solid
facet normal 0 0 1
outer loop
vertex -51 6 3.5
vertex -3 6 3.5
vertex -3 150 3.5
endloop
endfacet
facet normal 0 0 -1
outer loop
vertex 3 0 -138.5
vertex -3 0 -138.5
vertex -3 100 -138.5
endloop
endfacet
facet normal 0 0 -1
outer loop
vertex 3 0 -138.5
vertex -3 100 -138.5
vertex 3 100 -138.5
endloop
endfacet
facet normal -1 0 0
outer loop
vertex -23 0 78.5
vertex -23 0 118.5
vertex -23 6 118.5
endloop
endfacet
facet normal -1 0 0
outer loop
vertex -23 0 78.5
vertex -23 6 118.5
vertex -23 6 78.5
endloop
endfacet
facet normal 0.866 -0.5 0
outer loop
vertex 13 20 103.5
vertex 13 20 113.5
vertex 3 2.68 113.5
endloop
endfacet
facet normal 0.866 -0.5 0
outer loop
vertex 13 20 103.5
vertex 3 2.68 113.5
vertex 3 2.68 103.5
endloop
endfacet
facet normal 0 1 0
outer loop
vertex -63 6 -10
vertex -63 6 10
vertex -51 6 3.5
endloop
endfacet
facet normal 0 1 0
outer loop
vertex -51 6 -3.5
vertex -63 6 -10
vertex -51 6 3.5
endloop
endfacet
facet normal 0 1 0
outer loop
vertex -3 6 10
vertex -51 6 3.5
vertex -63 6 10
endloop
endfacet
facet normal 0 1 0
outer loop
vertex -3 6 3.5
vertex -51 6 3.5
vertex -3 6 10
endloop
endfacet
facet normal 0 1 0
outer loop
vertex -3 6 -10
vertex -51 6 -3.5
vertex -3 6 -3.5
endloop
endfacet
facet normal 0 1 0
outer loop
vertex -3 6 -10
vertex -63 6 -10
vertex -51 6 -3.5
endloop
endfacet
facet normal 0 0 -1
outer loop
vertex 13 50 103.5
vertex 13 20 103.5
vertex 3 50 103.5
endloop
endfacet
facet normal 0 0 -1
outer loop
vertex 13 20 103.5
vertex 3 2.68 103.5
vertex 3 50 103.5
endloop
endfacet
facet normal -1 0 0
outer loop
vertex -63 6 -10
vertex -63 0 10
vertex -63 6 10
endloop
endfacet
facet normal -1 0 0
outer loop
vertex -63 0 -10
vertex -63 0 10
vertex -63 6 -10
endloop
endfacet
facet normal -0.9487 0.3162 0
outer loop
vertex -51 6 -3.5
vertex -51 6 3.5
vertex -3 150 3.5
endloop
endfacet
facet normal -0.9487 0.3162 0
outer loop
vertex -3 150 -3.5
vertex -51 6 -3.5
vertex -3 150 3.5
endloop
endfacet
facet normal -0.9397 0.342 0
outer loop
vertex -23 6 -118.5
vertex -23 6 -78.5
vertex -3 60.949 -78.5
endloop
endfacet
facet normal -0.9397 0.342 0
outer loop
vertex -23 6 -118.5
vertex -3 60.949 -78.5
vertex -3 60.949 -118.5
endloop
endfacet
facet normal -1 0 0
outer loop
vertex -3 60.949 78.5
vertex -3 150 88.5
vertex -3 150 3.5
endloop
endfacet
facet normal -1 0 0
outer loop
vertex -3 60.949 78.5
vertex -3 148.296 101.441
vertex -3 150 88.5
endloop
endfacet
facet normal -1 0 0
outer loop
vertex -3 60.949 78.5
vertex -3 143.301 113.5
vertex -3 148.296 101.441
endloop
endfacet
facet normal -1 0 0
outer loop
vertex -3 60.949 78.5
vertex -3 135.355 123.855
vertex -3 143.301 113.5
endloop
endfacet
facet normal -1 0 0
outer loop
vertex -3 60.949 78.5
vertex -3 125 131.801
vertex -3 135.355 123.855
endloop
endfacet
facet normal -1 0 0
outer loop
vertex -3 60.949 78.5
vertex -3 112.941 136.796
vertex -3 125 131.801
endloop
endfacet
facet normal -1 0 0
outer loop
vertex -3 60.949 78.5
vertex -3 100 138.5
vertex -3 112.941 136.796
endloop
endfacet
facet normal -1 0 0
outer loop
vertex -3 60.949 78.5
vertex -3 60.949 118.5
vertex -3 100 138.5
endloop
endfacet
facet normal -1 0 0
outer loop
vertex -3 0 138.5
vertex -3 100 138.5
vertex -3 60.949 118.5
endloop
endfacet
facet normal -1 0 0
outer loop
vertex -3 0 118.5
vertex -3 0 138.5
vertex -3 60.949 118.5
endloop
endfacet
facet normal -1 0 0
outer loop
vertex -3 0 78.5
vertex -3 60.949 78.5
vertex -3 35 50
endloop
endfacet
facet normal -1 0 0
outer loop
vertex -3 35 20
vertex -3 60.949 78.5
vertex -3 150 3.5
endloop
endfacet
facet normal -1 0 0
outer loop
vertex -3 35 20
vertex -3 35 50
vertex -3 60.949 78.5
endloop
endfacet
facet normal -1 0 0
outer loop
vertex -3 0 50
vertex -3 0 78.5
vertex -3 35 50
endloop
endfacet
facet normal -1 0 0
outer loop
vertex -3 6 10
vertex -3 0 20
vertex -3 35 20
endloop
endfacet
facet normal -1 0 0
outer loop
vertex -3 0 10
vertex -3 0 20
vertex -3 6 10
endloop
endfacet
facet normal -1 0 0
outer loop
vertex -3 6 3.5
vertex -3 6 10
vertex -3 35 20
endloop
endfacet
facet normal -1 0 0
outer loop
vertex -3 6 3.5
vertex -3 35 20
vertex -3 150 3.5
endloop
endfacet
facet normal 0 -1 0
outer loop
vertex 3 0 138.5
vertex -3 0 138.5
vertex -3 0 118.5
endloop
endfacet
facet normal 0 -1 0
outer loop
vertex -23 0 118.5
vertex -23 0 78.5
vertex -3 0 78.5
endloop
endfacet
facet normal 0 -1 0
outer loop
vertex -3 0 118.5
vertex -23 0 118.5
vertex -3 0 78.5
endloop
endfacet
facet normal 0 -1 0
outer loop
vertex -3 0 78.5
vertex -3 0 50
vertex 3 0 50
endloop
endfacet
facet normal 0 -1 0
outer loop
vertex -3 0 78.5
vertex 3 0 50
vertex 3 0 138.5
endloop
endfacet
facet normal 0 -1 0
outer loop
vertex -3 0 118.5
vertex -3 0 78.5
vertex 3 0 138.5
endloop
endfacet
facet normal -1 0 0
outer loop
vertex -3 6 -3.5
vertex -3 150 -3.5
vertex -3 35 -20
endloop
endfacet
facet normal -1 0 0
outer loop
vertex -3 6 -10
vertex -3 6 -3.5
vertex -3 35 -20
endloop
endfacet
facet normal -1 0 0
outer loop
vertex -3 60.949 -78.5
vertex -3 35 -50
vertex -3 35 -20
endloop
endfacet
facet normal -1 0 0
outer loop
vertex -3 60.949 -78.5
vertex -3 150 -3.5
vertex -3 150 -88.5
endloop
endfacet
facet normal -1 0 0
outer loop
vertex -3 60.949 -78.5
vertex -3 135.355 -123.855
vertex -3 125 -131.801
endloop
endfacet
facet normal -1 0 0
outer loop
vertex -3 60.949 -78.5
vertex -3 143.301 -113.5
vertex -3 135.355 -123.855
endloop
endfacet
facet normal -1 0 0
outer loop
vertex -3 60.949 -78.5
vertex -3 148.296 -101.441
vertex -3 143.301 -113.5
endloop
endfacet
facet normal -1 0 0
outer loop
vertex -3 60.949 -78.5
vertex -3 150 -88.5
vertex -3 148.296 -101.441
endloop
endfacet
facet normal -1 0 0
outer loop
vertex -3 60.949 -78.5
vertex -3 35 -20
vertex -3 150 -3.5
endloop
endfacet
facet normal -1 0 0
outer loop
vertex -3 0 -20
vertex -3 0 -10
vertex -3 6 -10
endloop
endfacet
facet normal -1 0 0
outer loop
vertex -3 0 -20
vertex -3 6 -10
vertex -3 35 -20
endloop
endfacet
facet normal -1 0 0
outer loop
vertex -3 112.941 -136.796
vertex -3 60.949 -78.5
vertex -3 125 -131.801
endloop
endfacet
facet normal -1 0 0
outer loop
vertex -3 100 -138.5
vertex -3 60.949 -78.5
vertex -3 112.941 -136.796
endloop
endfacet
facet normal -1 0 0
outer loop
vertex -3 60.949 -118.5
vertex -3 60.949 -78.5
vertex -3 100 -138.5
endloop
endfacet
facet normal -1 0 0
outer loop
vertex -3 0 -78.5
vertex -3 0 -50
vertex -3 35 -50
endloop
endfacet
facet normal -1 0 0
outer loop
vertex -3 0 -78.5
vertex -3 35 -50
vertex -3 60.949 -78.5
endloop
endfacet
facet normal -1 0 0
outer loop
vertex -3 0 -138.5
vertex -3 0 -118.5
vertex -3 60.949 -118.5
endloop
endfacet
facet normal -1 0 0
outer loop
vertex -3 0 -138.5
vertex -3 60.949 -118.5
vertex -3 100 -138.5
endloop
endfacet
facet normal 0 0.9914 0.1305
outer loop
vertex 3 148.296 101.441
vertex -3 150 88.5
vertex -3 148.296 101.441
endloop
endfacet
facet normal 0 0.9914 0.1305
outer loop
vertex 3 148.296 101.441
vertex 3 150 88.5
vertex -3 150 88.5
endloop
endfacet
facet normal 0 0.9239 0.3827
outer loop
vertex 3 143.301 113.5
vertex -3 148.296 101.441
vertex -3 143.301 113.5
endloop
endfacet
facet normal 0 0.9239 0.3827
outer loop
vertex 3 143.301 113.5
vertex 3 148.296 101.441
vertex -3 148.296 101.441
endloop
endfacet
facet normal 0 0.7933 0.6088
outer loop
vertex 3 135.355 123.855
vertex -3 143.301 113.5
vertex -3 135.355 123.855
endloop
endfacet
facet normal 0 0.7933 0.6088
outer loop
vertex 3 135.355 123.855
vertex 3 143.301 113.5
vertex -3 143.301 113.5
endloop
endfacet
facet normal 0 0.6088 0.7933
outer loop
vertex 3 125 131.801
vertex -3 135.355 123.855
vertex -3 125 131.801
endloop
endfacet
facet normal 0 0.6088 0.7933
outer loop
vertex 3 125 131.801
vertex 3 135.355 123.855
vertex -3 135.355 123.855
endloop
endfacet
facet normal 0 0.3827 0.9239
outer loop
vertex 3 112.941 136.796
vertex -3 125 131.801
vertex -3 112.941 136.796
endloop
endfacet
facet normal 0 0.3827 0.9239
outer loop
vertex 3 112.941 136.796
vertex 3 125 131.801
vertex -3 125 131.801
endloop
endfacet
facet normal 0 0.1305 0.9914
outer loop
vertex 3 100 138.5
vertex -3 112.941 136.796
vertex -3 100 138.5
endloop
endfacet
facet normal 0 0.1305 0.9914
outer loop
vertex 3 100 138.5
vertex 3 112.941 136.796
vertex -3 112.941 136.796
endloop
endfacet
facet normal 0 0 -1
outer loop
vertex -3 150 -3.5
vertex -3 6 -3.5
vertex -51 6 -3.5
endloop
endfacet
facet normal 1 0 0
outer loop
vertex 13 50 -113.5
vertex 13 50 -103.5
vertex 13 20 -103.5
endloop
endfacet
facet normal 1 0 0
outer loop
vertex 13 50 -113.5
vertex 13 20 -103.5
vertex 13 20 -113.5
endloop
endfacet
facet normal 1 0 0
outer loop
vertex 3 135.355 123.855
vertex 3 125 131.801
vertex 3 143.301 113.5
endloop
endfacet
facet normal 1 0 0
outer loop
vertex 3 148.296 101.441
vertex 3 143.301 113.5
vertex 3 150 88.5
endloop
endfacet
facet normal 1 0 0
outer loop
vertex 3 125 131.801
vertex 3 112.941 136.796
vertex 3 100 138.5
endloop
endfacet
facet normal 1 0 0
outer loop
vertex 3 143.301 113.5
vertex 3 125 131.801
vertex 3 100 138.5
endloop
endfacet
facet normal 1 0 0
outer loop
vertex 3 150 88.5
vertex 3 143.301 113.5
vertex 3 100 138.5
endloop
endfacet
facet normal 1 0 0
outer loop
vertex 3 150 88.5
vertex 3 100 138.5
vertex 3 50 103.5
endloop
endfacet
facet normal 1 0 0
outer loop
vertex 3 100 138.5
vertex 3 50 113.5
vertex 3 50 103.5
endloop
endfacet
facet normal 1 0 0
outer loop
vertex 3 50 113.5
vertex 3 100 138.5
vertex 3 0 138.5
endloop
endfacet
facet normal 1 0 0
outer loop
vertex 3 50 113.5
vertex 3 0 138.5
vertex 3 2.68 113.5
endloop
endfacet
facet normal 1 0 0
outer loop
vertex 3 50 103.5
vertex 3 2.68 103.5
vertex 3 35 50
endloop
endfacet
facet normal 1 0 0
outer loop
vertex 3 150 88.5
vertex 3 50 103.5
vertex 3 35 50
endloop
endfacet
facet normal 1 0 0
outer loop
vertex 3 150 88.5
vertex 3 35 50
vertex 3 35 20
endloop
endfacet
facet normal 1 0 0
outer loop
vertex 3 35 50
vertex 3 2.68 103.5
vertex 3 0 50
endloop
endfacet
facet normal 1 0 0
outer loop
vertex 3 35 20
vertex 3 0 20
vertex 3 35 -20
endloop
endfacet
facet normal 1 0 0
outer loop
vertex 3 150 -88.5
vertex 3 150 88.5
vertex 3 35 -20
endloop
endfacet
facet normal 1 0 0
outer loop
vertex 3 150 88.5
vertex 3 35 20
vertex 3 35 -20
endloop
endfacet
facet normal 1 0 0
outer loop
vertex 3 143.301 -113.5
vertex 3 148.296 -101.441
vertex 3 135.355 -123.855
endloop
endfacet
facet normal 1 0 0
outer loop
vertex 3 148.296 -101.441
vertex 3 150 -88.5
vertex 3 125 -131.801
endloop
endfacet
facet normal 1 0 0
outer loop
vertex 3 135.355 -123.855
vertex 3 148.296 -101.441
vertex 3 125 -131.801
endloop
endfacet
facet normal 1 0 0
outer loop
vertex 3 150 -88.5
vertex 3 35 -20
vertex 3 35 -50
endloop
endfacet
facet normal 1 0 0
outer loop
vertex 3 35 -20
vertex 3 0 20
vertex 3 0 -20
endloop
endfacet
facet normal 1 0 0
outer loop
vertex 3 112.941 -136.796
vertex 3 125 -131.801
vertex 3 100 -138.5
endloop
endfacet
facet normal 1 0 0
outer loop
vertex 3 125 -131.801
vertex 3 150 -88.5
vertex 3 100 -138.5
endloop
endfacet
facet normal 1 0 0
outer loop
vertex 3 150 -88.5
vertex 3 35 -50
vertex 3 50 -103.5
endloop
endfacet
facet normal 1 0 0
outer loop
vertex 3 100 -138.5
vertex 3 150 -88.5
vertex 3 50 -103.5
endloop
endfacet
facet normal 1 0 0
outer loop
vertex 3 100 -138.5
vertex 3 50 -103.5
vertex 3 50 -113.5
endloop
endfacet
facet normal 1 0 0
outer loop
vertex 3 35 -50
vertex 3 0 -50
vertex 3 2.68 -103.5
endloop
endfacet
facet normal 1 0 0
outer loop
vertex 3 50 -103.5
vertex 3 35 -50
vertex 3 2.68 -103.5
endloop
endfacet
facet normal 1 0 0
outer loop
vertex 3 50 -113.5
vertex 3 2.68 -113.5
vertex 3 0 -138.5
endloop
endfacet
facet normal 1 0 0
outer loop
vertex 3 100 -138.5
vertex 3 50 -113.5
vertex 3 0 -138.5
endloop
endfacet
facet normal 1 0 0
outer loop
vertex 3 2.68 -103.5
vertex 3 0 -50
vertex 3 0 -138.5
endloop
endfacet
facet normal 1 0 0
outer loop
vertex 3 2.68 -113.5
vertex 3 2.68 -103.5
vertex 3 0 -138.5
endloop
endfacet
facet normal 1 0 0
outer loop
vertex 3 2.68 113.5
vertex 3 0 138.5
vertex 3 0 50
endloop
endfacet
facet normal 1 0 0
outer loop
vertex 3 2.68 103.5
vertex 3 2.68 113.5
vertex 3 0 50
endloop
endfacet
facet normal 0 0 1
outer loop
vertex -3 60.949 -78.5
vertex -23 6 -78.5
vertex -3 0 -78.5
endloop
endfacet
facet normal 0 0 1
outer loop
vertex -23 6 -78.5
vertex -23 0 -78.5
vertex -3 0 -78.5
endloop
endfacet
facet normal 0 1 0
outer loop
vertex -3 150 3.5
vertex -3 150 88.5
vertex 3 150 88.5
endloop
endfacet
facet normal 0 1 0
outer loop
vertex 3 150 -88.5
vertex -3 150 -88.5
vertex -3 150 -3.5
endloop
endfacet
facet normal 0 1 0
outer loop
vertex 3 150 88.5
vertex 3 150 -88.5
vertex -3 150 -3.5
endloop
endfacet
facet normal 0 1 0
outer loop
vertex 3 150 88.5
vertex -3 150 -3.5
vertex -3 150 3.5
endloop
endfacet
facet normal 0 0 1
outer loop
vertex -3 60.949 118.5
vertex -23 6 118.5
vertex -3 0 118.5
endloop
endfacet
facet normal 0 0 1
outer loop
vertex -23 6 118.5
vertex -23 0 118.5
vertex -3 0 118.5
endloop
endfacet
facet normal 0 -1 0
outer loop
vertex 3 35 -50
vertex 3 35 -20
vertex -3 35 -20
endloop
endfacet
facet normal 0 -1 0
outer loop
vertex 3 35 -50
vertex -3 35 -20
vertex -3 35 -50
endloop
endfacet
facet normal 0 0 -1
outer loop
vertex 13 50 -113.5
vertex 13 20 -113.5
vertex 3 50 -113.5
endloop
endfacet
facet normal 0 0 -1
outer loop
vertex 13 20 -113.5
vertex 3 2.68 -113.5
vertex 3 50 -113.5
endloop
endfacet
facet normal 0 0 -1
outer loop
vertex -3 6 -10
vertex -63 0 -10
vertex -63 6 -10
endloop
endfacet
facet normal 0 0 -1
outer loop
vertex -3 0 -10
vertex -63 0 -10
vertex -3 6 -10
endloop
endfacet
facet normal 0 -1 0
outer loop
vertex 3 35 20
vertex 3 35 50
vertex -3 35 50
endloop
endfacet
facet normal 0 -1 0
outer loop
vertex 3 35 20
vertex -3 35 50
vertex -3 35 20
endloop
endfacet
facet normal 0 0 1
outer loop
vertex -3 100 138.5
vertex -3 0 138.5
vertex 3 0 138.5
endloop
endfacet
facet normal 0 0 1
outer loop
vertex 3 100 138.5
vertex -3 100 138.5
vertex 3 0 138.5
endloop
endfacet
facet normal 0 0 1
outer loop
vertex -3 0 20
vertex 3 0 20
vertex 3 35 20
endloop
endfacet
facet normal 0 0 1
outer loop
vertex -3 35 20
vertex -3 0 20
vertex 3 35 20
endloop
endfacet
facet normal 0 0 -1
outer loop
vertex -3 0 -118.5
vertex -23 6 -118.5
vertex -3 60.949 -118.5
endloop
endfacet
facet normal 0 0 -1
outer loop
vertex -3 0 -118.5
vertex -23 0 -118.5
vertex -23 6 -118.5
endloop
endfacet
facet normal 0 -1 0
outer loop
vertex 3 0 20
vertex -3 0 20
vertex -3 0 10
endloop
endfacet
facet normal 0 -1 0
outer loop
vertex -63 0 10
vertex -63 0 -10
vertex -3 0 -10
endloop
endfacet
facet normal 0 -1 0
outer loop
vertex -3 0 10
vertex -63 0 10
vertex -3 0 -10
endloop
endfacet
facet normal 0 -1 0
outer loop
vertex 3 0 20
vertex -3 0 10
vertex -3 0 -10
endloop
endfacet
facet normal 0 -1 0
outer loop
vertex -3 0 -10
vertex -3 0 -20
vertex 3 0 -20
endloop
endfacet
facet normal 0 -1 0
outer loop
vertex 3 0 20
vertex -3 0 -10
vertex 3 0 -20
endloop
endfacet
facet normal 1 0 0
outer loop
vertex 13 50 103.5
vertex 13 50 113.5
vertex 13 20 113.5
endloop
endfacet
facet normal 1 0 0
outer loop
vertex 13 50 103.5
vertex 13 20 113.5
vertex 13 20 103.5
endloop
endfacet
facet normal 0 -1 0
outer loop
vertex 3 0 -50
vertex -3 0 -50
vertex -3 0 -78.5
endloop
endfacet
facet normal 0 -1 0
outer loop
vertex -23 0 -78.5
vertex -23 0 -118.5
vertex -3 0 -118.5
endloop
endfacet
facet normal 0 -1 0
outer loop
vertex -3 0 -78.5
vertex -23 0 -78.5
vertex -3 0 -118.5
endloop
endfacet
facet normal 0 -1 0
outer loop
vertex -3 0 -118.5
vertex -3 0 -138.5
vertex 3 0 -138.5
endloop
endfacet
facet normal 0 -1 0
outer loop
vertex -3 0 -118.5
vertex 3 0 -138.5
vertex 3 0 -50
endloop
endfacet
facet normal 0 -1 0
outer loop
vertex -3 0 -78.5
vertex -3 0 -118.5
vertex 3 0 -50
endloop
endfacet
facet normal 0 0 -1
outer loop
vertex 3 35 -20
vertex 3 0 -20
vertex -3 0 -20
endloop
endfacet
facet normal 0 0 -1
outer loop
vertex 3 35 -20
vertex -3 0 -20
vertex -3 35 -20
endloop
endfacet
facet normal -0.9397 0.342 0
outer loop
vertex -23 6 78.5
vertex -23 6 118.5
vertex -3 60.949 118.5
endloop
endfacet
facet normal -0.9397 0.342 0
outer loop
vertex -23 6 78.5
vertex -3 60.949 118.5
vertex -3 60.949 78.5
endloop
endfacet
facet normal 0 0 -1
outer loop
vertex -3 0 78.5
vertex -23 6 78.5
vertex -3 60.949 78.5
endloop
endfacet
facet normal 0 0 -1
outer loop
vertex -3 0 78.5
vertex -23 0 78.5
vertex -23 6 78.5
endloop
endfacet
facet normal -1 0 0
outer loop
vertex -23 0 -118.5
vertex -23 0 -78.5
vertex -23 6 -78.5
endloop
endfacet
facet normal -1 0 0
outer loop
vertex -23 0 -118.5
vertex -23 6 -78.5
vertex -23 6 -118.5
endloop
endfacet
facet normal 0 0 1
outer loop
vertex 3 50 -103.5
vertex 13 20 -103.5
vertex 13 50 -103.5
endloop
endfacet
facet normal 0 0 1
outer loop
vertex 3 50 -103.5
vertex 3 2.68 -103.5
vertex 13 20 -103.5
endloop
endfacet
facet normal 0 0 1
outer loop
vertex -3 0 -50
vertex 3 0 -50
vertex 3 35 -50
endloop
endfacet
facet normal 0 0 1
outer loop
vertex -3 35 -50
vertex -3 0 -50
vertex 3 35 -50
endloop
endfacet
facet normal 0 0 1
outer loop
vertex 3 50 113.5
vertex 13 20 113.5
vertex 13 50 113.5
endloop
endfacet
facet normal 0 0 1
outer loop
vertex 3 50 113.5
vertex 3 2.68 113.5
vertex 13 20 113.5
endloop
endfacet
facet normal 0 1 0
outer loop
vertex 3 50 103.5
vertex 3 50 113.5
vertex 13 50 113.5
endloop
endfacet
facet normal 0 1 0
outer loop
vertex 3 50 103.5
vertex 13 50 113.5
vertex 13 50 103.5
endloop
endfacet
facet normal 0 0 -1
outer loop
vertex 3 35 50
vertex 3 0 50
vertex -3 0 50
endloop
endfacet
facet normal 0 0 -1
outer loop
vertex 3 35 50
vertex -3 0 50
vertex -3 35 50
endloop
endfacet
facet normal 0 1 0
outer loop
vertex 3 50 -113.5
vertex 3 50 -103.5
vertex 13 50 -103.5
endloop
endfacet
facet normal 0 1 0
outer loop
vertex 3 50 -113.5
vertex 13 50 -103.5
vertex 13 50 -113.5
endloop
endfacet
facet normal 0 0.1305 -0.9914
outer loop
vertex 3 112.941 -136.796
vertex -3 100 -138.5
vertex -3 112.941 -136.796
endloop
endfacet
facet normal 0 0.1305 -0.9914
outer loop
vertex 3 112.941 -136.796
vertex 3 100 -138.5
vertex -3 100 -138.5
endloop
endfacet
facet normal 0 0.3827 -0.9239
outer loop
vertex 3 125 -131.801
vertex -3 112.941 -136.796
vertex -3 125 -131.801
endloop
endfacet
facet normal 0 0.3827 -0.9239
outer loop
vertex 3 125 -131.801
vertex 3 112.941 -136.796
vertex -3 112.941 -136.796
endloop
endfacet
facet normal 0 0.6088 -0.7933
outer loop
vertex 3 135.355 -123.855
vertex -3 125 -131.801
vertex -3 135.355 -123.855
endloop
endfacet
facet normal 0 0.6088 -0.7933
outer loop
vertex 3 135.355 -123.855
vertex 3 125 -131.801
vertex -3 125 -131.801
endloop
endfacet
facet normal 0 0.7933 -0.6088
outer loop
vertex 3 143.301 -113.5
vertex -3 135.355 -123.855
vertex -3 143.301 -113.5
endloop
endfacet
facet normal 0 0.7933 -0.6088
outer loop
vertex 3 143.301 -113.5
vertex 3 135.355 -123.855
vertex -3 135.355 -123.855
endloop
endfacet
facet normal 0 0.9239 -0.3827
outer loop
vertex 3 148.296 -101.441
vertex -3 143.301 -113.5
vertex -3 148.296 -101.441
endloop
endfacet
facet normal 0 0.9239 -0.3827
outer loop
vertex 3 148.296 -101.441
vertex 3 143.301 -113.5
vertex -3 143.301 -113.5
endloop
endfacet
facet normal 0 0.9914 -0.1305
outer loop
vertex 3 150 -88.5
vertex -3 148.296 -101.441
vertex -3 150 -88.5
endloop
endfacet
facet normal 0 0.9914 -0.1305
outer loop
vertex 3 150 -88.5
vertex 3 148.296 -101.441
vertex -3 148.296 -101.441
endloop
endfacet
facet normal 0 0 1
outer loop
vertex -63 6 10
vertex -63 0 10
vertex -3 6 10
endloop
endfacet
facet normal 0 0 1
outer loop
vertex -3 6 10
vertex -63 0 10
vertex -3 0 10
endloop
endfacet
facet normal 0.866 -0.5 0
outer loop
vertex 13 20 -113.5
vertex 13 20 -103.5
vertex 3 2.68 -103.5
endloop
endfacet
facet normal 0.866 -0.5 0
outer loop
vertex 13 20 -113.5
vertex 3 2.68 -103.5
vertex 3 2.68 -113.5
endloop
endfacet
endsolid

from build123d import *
from OCP.BRepFilletAPI import BRepFilletAPI_MakeChamfer

# Parameters (mm, degrees)
SKETCH_1_W          = 6
SKETCH_1_H          = 277
EXTRUDE_1_DEPTH     = 150
SKETCH_2_W          = 20
SKETCH_2_H          = 40
SKETCH_2_W_2        = 60
SKETCH_2_H_2        = 20
EXTRUDE_2_DEPTH     = 6
EXTRUDE_3_DEPTH     = 7
CHAMFER_2_SIZE      = 54.949548389
CHAMFER_2_SIZE_2    = 20
SKETCH_5_W          = 10
SKETCH_5_H          = 30
EXTRUDE_4_DEPTH     = 10
CHAMFER_3_SIZE      = 17.320508076
CHAMFER_3_SIZE_2    = 10
SKETCH_6_W          = 30
SKETCH_6_H          = 35
CUT_EXTRUDE_1_DEPTH = 10
FILLET_2_R          = 50


with BuildPart() as part:
    # Эскиз1 → Бобышка-Вытянуть1 (new body)
    with BuildSketch(Plane(origin=(0, 0, 0), x_dir=(1, 0, 0), z_dir=(0, 1, 0))):
        Rectangle(SKETCH_1_W, SKETCH_1_H)
    extrude(amount=EXTRUDE_1_DEPTH)

    # Эскиз2 → Бобышка-Вытянуть2 (add)
    with BuildSketch(Plane(origin=(0, 0, 0), x_dir=(1, 0, 0), z_dir=(0, 1, 0))):
        with Locations((-13, 98.5)):
            Rectangle(SKETCH_2_W, SKETCH_2_H)
        with Locations((-13, -98.5)):
            Rectangle(SKETCH_2_W, SKETCH_2_H)
        with Locations((-33, 0)):
            Rectangle(SKETCH_2_W_2, SKETCH_2_H_2)
    extrude(amount=EXTRUDE_2_DEPTH)

    # Эскиз3 → Бобышка-Вытянуть3 (add)
    with BuildSketch(Plane.XY.offset(3.5)):
        Polygon((-3, 6), (-51, 6), (-3, 150), align=None)
    extrude(amount=-EXTRUDE_3_DEPTH)

    # Фаска2
    chamfer_2_edges_1 = [part.edges().sort_by_distance(p)[0] for p in [
        (-3, 6, 98.5),
    ]]
    chamfer_2_side_1 = [part.faces().sort_by_distance(p)[0] for p in [
        (-3, 6.4, 98.5),
    ]]
    chamfer_2_edges_2 = [part.edges().sort_by_distance(p)[0] for p in [
        (-3, 6, -98.5),
    ]]
    chamfer_2_side_2 = [part.faces().sort_by_distance(p)[0] for p in [
        (-3, 6.4, -98.5),
    ]]
    chamfer_2 = BRepFilletAPI_MakeChamfer(part.part.solid().wrapped)
    for e in chamfer_2_edges_1:
        chamfer_2.Add(CHAMFER_2_SIZE - 0.0001, CHAMFER_2_SIZE_2 - 0.0001, e.wrapped, chamfer_2_side_1[0].wrapped)
    for e in chamfer_2_edges_2:
        chamfer_2.Add(CHAMFER_2_SIZE - 0.0001, CHAMFER_2_SIZE_2 - 0.0001, e.wrapped, chamfer_2_side_2[0].wrapped)
    add(Compound.cast(chamfer_2.Shape()), mode=Mode.REPLACE)  # a hair under: the kernel refuses the full size

    # Эскиз5 → Бобышка-Вытянуть4 (add)
    with BuildSketch(Plane(origin=(3, 0, 0), x_dir=(0, 0, -1), z_dir=(1, 0, 0))):
        with Locations((-108.5, 35)):
            Rectangle(SKETCH_5_W, SKETCH_5_H)
        with Locations((108.5, 35)):
            Rectangle(SKETCH_5_W, SKETCH_5_H)
    extrude(amount=EXTRUDE_4_DEPTH)

    # Фаска3
    chamfer_3_edges_1 = [part.edges().sort_by_distance(p)[0] for p in [
        (3, 20, 108.5),
    ]]
    chamfer_3_side_1 = [part.faces().sort_by_distance(p)[0] for p in [
        (3, 19.8, 108.5),
    ]]
    chamfer_3_edges_2 = [part.edges().sort_by_distance(p)[0] for p in [
        (3, 20, -108.5),
    ]]
    chamfer_3_side_2 = [part.faces().sort_by_distance(p)[0] for p in [
        (3, 19.8, -108.5),
    ]]
    chamfer_3 = BRepFilletAPI_MakeChamfer(part.part.solid().wrapped)
    for e in chamfer_3_edges_1:
        chamfer_3.Add(CHAMFER_3_SIZE - 0.0001, CHAMFER_3_SIZE_2 - 0.0001, e.wrapped, chamfer_3_side_1[0].wrapped)
    for e in chamfer_3_edges_2:
        chamfer_3.Add(CHAMFER_3_SIZE - 0.0001, CHAMFER_3_SIZE_2 - 0.0001, e.wrapped, chamfer_3_side_2[0].wrapped)
    add(Compound.cast(chamfer_3.Shape()), mode=Mode.REPLACE)  # a hair under: the kernel refuses the full size

    # Эскиз6 → Вырез-Вытянуть1 (cut)
    with BuildSketch(Plane(origin=(3, 0, 0), x_dir=(0, 0, -1), z_dir=(1, 0, 0))):
        with Locations((-35, 17.5)):
            Rectangle(SKETCH_6_W, SKETCH_6_H)
        with Locations((35, 17.5)):
            Rectangle(SKETCH_6_W, SKETCH_6_H)
    extrude(amount=-CUT_EXTRUDE_1_DEPTH, mode=Mode.SUBTRACT)

    # Скругление2
    fillet_2_edges = [part.edges().sort_by_distance(p)[0] for p in [
        (0, 150, 138.5),
        (0, 150, -138.5),
    ]]
    fillet(fillet_2_edges, radius=FILLET_2_R)


solid = part.part
